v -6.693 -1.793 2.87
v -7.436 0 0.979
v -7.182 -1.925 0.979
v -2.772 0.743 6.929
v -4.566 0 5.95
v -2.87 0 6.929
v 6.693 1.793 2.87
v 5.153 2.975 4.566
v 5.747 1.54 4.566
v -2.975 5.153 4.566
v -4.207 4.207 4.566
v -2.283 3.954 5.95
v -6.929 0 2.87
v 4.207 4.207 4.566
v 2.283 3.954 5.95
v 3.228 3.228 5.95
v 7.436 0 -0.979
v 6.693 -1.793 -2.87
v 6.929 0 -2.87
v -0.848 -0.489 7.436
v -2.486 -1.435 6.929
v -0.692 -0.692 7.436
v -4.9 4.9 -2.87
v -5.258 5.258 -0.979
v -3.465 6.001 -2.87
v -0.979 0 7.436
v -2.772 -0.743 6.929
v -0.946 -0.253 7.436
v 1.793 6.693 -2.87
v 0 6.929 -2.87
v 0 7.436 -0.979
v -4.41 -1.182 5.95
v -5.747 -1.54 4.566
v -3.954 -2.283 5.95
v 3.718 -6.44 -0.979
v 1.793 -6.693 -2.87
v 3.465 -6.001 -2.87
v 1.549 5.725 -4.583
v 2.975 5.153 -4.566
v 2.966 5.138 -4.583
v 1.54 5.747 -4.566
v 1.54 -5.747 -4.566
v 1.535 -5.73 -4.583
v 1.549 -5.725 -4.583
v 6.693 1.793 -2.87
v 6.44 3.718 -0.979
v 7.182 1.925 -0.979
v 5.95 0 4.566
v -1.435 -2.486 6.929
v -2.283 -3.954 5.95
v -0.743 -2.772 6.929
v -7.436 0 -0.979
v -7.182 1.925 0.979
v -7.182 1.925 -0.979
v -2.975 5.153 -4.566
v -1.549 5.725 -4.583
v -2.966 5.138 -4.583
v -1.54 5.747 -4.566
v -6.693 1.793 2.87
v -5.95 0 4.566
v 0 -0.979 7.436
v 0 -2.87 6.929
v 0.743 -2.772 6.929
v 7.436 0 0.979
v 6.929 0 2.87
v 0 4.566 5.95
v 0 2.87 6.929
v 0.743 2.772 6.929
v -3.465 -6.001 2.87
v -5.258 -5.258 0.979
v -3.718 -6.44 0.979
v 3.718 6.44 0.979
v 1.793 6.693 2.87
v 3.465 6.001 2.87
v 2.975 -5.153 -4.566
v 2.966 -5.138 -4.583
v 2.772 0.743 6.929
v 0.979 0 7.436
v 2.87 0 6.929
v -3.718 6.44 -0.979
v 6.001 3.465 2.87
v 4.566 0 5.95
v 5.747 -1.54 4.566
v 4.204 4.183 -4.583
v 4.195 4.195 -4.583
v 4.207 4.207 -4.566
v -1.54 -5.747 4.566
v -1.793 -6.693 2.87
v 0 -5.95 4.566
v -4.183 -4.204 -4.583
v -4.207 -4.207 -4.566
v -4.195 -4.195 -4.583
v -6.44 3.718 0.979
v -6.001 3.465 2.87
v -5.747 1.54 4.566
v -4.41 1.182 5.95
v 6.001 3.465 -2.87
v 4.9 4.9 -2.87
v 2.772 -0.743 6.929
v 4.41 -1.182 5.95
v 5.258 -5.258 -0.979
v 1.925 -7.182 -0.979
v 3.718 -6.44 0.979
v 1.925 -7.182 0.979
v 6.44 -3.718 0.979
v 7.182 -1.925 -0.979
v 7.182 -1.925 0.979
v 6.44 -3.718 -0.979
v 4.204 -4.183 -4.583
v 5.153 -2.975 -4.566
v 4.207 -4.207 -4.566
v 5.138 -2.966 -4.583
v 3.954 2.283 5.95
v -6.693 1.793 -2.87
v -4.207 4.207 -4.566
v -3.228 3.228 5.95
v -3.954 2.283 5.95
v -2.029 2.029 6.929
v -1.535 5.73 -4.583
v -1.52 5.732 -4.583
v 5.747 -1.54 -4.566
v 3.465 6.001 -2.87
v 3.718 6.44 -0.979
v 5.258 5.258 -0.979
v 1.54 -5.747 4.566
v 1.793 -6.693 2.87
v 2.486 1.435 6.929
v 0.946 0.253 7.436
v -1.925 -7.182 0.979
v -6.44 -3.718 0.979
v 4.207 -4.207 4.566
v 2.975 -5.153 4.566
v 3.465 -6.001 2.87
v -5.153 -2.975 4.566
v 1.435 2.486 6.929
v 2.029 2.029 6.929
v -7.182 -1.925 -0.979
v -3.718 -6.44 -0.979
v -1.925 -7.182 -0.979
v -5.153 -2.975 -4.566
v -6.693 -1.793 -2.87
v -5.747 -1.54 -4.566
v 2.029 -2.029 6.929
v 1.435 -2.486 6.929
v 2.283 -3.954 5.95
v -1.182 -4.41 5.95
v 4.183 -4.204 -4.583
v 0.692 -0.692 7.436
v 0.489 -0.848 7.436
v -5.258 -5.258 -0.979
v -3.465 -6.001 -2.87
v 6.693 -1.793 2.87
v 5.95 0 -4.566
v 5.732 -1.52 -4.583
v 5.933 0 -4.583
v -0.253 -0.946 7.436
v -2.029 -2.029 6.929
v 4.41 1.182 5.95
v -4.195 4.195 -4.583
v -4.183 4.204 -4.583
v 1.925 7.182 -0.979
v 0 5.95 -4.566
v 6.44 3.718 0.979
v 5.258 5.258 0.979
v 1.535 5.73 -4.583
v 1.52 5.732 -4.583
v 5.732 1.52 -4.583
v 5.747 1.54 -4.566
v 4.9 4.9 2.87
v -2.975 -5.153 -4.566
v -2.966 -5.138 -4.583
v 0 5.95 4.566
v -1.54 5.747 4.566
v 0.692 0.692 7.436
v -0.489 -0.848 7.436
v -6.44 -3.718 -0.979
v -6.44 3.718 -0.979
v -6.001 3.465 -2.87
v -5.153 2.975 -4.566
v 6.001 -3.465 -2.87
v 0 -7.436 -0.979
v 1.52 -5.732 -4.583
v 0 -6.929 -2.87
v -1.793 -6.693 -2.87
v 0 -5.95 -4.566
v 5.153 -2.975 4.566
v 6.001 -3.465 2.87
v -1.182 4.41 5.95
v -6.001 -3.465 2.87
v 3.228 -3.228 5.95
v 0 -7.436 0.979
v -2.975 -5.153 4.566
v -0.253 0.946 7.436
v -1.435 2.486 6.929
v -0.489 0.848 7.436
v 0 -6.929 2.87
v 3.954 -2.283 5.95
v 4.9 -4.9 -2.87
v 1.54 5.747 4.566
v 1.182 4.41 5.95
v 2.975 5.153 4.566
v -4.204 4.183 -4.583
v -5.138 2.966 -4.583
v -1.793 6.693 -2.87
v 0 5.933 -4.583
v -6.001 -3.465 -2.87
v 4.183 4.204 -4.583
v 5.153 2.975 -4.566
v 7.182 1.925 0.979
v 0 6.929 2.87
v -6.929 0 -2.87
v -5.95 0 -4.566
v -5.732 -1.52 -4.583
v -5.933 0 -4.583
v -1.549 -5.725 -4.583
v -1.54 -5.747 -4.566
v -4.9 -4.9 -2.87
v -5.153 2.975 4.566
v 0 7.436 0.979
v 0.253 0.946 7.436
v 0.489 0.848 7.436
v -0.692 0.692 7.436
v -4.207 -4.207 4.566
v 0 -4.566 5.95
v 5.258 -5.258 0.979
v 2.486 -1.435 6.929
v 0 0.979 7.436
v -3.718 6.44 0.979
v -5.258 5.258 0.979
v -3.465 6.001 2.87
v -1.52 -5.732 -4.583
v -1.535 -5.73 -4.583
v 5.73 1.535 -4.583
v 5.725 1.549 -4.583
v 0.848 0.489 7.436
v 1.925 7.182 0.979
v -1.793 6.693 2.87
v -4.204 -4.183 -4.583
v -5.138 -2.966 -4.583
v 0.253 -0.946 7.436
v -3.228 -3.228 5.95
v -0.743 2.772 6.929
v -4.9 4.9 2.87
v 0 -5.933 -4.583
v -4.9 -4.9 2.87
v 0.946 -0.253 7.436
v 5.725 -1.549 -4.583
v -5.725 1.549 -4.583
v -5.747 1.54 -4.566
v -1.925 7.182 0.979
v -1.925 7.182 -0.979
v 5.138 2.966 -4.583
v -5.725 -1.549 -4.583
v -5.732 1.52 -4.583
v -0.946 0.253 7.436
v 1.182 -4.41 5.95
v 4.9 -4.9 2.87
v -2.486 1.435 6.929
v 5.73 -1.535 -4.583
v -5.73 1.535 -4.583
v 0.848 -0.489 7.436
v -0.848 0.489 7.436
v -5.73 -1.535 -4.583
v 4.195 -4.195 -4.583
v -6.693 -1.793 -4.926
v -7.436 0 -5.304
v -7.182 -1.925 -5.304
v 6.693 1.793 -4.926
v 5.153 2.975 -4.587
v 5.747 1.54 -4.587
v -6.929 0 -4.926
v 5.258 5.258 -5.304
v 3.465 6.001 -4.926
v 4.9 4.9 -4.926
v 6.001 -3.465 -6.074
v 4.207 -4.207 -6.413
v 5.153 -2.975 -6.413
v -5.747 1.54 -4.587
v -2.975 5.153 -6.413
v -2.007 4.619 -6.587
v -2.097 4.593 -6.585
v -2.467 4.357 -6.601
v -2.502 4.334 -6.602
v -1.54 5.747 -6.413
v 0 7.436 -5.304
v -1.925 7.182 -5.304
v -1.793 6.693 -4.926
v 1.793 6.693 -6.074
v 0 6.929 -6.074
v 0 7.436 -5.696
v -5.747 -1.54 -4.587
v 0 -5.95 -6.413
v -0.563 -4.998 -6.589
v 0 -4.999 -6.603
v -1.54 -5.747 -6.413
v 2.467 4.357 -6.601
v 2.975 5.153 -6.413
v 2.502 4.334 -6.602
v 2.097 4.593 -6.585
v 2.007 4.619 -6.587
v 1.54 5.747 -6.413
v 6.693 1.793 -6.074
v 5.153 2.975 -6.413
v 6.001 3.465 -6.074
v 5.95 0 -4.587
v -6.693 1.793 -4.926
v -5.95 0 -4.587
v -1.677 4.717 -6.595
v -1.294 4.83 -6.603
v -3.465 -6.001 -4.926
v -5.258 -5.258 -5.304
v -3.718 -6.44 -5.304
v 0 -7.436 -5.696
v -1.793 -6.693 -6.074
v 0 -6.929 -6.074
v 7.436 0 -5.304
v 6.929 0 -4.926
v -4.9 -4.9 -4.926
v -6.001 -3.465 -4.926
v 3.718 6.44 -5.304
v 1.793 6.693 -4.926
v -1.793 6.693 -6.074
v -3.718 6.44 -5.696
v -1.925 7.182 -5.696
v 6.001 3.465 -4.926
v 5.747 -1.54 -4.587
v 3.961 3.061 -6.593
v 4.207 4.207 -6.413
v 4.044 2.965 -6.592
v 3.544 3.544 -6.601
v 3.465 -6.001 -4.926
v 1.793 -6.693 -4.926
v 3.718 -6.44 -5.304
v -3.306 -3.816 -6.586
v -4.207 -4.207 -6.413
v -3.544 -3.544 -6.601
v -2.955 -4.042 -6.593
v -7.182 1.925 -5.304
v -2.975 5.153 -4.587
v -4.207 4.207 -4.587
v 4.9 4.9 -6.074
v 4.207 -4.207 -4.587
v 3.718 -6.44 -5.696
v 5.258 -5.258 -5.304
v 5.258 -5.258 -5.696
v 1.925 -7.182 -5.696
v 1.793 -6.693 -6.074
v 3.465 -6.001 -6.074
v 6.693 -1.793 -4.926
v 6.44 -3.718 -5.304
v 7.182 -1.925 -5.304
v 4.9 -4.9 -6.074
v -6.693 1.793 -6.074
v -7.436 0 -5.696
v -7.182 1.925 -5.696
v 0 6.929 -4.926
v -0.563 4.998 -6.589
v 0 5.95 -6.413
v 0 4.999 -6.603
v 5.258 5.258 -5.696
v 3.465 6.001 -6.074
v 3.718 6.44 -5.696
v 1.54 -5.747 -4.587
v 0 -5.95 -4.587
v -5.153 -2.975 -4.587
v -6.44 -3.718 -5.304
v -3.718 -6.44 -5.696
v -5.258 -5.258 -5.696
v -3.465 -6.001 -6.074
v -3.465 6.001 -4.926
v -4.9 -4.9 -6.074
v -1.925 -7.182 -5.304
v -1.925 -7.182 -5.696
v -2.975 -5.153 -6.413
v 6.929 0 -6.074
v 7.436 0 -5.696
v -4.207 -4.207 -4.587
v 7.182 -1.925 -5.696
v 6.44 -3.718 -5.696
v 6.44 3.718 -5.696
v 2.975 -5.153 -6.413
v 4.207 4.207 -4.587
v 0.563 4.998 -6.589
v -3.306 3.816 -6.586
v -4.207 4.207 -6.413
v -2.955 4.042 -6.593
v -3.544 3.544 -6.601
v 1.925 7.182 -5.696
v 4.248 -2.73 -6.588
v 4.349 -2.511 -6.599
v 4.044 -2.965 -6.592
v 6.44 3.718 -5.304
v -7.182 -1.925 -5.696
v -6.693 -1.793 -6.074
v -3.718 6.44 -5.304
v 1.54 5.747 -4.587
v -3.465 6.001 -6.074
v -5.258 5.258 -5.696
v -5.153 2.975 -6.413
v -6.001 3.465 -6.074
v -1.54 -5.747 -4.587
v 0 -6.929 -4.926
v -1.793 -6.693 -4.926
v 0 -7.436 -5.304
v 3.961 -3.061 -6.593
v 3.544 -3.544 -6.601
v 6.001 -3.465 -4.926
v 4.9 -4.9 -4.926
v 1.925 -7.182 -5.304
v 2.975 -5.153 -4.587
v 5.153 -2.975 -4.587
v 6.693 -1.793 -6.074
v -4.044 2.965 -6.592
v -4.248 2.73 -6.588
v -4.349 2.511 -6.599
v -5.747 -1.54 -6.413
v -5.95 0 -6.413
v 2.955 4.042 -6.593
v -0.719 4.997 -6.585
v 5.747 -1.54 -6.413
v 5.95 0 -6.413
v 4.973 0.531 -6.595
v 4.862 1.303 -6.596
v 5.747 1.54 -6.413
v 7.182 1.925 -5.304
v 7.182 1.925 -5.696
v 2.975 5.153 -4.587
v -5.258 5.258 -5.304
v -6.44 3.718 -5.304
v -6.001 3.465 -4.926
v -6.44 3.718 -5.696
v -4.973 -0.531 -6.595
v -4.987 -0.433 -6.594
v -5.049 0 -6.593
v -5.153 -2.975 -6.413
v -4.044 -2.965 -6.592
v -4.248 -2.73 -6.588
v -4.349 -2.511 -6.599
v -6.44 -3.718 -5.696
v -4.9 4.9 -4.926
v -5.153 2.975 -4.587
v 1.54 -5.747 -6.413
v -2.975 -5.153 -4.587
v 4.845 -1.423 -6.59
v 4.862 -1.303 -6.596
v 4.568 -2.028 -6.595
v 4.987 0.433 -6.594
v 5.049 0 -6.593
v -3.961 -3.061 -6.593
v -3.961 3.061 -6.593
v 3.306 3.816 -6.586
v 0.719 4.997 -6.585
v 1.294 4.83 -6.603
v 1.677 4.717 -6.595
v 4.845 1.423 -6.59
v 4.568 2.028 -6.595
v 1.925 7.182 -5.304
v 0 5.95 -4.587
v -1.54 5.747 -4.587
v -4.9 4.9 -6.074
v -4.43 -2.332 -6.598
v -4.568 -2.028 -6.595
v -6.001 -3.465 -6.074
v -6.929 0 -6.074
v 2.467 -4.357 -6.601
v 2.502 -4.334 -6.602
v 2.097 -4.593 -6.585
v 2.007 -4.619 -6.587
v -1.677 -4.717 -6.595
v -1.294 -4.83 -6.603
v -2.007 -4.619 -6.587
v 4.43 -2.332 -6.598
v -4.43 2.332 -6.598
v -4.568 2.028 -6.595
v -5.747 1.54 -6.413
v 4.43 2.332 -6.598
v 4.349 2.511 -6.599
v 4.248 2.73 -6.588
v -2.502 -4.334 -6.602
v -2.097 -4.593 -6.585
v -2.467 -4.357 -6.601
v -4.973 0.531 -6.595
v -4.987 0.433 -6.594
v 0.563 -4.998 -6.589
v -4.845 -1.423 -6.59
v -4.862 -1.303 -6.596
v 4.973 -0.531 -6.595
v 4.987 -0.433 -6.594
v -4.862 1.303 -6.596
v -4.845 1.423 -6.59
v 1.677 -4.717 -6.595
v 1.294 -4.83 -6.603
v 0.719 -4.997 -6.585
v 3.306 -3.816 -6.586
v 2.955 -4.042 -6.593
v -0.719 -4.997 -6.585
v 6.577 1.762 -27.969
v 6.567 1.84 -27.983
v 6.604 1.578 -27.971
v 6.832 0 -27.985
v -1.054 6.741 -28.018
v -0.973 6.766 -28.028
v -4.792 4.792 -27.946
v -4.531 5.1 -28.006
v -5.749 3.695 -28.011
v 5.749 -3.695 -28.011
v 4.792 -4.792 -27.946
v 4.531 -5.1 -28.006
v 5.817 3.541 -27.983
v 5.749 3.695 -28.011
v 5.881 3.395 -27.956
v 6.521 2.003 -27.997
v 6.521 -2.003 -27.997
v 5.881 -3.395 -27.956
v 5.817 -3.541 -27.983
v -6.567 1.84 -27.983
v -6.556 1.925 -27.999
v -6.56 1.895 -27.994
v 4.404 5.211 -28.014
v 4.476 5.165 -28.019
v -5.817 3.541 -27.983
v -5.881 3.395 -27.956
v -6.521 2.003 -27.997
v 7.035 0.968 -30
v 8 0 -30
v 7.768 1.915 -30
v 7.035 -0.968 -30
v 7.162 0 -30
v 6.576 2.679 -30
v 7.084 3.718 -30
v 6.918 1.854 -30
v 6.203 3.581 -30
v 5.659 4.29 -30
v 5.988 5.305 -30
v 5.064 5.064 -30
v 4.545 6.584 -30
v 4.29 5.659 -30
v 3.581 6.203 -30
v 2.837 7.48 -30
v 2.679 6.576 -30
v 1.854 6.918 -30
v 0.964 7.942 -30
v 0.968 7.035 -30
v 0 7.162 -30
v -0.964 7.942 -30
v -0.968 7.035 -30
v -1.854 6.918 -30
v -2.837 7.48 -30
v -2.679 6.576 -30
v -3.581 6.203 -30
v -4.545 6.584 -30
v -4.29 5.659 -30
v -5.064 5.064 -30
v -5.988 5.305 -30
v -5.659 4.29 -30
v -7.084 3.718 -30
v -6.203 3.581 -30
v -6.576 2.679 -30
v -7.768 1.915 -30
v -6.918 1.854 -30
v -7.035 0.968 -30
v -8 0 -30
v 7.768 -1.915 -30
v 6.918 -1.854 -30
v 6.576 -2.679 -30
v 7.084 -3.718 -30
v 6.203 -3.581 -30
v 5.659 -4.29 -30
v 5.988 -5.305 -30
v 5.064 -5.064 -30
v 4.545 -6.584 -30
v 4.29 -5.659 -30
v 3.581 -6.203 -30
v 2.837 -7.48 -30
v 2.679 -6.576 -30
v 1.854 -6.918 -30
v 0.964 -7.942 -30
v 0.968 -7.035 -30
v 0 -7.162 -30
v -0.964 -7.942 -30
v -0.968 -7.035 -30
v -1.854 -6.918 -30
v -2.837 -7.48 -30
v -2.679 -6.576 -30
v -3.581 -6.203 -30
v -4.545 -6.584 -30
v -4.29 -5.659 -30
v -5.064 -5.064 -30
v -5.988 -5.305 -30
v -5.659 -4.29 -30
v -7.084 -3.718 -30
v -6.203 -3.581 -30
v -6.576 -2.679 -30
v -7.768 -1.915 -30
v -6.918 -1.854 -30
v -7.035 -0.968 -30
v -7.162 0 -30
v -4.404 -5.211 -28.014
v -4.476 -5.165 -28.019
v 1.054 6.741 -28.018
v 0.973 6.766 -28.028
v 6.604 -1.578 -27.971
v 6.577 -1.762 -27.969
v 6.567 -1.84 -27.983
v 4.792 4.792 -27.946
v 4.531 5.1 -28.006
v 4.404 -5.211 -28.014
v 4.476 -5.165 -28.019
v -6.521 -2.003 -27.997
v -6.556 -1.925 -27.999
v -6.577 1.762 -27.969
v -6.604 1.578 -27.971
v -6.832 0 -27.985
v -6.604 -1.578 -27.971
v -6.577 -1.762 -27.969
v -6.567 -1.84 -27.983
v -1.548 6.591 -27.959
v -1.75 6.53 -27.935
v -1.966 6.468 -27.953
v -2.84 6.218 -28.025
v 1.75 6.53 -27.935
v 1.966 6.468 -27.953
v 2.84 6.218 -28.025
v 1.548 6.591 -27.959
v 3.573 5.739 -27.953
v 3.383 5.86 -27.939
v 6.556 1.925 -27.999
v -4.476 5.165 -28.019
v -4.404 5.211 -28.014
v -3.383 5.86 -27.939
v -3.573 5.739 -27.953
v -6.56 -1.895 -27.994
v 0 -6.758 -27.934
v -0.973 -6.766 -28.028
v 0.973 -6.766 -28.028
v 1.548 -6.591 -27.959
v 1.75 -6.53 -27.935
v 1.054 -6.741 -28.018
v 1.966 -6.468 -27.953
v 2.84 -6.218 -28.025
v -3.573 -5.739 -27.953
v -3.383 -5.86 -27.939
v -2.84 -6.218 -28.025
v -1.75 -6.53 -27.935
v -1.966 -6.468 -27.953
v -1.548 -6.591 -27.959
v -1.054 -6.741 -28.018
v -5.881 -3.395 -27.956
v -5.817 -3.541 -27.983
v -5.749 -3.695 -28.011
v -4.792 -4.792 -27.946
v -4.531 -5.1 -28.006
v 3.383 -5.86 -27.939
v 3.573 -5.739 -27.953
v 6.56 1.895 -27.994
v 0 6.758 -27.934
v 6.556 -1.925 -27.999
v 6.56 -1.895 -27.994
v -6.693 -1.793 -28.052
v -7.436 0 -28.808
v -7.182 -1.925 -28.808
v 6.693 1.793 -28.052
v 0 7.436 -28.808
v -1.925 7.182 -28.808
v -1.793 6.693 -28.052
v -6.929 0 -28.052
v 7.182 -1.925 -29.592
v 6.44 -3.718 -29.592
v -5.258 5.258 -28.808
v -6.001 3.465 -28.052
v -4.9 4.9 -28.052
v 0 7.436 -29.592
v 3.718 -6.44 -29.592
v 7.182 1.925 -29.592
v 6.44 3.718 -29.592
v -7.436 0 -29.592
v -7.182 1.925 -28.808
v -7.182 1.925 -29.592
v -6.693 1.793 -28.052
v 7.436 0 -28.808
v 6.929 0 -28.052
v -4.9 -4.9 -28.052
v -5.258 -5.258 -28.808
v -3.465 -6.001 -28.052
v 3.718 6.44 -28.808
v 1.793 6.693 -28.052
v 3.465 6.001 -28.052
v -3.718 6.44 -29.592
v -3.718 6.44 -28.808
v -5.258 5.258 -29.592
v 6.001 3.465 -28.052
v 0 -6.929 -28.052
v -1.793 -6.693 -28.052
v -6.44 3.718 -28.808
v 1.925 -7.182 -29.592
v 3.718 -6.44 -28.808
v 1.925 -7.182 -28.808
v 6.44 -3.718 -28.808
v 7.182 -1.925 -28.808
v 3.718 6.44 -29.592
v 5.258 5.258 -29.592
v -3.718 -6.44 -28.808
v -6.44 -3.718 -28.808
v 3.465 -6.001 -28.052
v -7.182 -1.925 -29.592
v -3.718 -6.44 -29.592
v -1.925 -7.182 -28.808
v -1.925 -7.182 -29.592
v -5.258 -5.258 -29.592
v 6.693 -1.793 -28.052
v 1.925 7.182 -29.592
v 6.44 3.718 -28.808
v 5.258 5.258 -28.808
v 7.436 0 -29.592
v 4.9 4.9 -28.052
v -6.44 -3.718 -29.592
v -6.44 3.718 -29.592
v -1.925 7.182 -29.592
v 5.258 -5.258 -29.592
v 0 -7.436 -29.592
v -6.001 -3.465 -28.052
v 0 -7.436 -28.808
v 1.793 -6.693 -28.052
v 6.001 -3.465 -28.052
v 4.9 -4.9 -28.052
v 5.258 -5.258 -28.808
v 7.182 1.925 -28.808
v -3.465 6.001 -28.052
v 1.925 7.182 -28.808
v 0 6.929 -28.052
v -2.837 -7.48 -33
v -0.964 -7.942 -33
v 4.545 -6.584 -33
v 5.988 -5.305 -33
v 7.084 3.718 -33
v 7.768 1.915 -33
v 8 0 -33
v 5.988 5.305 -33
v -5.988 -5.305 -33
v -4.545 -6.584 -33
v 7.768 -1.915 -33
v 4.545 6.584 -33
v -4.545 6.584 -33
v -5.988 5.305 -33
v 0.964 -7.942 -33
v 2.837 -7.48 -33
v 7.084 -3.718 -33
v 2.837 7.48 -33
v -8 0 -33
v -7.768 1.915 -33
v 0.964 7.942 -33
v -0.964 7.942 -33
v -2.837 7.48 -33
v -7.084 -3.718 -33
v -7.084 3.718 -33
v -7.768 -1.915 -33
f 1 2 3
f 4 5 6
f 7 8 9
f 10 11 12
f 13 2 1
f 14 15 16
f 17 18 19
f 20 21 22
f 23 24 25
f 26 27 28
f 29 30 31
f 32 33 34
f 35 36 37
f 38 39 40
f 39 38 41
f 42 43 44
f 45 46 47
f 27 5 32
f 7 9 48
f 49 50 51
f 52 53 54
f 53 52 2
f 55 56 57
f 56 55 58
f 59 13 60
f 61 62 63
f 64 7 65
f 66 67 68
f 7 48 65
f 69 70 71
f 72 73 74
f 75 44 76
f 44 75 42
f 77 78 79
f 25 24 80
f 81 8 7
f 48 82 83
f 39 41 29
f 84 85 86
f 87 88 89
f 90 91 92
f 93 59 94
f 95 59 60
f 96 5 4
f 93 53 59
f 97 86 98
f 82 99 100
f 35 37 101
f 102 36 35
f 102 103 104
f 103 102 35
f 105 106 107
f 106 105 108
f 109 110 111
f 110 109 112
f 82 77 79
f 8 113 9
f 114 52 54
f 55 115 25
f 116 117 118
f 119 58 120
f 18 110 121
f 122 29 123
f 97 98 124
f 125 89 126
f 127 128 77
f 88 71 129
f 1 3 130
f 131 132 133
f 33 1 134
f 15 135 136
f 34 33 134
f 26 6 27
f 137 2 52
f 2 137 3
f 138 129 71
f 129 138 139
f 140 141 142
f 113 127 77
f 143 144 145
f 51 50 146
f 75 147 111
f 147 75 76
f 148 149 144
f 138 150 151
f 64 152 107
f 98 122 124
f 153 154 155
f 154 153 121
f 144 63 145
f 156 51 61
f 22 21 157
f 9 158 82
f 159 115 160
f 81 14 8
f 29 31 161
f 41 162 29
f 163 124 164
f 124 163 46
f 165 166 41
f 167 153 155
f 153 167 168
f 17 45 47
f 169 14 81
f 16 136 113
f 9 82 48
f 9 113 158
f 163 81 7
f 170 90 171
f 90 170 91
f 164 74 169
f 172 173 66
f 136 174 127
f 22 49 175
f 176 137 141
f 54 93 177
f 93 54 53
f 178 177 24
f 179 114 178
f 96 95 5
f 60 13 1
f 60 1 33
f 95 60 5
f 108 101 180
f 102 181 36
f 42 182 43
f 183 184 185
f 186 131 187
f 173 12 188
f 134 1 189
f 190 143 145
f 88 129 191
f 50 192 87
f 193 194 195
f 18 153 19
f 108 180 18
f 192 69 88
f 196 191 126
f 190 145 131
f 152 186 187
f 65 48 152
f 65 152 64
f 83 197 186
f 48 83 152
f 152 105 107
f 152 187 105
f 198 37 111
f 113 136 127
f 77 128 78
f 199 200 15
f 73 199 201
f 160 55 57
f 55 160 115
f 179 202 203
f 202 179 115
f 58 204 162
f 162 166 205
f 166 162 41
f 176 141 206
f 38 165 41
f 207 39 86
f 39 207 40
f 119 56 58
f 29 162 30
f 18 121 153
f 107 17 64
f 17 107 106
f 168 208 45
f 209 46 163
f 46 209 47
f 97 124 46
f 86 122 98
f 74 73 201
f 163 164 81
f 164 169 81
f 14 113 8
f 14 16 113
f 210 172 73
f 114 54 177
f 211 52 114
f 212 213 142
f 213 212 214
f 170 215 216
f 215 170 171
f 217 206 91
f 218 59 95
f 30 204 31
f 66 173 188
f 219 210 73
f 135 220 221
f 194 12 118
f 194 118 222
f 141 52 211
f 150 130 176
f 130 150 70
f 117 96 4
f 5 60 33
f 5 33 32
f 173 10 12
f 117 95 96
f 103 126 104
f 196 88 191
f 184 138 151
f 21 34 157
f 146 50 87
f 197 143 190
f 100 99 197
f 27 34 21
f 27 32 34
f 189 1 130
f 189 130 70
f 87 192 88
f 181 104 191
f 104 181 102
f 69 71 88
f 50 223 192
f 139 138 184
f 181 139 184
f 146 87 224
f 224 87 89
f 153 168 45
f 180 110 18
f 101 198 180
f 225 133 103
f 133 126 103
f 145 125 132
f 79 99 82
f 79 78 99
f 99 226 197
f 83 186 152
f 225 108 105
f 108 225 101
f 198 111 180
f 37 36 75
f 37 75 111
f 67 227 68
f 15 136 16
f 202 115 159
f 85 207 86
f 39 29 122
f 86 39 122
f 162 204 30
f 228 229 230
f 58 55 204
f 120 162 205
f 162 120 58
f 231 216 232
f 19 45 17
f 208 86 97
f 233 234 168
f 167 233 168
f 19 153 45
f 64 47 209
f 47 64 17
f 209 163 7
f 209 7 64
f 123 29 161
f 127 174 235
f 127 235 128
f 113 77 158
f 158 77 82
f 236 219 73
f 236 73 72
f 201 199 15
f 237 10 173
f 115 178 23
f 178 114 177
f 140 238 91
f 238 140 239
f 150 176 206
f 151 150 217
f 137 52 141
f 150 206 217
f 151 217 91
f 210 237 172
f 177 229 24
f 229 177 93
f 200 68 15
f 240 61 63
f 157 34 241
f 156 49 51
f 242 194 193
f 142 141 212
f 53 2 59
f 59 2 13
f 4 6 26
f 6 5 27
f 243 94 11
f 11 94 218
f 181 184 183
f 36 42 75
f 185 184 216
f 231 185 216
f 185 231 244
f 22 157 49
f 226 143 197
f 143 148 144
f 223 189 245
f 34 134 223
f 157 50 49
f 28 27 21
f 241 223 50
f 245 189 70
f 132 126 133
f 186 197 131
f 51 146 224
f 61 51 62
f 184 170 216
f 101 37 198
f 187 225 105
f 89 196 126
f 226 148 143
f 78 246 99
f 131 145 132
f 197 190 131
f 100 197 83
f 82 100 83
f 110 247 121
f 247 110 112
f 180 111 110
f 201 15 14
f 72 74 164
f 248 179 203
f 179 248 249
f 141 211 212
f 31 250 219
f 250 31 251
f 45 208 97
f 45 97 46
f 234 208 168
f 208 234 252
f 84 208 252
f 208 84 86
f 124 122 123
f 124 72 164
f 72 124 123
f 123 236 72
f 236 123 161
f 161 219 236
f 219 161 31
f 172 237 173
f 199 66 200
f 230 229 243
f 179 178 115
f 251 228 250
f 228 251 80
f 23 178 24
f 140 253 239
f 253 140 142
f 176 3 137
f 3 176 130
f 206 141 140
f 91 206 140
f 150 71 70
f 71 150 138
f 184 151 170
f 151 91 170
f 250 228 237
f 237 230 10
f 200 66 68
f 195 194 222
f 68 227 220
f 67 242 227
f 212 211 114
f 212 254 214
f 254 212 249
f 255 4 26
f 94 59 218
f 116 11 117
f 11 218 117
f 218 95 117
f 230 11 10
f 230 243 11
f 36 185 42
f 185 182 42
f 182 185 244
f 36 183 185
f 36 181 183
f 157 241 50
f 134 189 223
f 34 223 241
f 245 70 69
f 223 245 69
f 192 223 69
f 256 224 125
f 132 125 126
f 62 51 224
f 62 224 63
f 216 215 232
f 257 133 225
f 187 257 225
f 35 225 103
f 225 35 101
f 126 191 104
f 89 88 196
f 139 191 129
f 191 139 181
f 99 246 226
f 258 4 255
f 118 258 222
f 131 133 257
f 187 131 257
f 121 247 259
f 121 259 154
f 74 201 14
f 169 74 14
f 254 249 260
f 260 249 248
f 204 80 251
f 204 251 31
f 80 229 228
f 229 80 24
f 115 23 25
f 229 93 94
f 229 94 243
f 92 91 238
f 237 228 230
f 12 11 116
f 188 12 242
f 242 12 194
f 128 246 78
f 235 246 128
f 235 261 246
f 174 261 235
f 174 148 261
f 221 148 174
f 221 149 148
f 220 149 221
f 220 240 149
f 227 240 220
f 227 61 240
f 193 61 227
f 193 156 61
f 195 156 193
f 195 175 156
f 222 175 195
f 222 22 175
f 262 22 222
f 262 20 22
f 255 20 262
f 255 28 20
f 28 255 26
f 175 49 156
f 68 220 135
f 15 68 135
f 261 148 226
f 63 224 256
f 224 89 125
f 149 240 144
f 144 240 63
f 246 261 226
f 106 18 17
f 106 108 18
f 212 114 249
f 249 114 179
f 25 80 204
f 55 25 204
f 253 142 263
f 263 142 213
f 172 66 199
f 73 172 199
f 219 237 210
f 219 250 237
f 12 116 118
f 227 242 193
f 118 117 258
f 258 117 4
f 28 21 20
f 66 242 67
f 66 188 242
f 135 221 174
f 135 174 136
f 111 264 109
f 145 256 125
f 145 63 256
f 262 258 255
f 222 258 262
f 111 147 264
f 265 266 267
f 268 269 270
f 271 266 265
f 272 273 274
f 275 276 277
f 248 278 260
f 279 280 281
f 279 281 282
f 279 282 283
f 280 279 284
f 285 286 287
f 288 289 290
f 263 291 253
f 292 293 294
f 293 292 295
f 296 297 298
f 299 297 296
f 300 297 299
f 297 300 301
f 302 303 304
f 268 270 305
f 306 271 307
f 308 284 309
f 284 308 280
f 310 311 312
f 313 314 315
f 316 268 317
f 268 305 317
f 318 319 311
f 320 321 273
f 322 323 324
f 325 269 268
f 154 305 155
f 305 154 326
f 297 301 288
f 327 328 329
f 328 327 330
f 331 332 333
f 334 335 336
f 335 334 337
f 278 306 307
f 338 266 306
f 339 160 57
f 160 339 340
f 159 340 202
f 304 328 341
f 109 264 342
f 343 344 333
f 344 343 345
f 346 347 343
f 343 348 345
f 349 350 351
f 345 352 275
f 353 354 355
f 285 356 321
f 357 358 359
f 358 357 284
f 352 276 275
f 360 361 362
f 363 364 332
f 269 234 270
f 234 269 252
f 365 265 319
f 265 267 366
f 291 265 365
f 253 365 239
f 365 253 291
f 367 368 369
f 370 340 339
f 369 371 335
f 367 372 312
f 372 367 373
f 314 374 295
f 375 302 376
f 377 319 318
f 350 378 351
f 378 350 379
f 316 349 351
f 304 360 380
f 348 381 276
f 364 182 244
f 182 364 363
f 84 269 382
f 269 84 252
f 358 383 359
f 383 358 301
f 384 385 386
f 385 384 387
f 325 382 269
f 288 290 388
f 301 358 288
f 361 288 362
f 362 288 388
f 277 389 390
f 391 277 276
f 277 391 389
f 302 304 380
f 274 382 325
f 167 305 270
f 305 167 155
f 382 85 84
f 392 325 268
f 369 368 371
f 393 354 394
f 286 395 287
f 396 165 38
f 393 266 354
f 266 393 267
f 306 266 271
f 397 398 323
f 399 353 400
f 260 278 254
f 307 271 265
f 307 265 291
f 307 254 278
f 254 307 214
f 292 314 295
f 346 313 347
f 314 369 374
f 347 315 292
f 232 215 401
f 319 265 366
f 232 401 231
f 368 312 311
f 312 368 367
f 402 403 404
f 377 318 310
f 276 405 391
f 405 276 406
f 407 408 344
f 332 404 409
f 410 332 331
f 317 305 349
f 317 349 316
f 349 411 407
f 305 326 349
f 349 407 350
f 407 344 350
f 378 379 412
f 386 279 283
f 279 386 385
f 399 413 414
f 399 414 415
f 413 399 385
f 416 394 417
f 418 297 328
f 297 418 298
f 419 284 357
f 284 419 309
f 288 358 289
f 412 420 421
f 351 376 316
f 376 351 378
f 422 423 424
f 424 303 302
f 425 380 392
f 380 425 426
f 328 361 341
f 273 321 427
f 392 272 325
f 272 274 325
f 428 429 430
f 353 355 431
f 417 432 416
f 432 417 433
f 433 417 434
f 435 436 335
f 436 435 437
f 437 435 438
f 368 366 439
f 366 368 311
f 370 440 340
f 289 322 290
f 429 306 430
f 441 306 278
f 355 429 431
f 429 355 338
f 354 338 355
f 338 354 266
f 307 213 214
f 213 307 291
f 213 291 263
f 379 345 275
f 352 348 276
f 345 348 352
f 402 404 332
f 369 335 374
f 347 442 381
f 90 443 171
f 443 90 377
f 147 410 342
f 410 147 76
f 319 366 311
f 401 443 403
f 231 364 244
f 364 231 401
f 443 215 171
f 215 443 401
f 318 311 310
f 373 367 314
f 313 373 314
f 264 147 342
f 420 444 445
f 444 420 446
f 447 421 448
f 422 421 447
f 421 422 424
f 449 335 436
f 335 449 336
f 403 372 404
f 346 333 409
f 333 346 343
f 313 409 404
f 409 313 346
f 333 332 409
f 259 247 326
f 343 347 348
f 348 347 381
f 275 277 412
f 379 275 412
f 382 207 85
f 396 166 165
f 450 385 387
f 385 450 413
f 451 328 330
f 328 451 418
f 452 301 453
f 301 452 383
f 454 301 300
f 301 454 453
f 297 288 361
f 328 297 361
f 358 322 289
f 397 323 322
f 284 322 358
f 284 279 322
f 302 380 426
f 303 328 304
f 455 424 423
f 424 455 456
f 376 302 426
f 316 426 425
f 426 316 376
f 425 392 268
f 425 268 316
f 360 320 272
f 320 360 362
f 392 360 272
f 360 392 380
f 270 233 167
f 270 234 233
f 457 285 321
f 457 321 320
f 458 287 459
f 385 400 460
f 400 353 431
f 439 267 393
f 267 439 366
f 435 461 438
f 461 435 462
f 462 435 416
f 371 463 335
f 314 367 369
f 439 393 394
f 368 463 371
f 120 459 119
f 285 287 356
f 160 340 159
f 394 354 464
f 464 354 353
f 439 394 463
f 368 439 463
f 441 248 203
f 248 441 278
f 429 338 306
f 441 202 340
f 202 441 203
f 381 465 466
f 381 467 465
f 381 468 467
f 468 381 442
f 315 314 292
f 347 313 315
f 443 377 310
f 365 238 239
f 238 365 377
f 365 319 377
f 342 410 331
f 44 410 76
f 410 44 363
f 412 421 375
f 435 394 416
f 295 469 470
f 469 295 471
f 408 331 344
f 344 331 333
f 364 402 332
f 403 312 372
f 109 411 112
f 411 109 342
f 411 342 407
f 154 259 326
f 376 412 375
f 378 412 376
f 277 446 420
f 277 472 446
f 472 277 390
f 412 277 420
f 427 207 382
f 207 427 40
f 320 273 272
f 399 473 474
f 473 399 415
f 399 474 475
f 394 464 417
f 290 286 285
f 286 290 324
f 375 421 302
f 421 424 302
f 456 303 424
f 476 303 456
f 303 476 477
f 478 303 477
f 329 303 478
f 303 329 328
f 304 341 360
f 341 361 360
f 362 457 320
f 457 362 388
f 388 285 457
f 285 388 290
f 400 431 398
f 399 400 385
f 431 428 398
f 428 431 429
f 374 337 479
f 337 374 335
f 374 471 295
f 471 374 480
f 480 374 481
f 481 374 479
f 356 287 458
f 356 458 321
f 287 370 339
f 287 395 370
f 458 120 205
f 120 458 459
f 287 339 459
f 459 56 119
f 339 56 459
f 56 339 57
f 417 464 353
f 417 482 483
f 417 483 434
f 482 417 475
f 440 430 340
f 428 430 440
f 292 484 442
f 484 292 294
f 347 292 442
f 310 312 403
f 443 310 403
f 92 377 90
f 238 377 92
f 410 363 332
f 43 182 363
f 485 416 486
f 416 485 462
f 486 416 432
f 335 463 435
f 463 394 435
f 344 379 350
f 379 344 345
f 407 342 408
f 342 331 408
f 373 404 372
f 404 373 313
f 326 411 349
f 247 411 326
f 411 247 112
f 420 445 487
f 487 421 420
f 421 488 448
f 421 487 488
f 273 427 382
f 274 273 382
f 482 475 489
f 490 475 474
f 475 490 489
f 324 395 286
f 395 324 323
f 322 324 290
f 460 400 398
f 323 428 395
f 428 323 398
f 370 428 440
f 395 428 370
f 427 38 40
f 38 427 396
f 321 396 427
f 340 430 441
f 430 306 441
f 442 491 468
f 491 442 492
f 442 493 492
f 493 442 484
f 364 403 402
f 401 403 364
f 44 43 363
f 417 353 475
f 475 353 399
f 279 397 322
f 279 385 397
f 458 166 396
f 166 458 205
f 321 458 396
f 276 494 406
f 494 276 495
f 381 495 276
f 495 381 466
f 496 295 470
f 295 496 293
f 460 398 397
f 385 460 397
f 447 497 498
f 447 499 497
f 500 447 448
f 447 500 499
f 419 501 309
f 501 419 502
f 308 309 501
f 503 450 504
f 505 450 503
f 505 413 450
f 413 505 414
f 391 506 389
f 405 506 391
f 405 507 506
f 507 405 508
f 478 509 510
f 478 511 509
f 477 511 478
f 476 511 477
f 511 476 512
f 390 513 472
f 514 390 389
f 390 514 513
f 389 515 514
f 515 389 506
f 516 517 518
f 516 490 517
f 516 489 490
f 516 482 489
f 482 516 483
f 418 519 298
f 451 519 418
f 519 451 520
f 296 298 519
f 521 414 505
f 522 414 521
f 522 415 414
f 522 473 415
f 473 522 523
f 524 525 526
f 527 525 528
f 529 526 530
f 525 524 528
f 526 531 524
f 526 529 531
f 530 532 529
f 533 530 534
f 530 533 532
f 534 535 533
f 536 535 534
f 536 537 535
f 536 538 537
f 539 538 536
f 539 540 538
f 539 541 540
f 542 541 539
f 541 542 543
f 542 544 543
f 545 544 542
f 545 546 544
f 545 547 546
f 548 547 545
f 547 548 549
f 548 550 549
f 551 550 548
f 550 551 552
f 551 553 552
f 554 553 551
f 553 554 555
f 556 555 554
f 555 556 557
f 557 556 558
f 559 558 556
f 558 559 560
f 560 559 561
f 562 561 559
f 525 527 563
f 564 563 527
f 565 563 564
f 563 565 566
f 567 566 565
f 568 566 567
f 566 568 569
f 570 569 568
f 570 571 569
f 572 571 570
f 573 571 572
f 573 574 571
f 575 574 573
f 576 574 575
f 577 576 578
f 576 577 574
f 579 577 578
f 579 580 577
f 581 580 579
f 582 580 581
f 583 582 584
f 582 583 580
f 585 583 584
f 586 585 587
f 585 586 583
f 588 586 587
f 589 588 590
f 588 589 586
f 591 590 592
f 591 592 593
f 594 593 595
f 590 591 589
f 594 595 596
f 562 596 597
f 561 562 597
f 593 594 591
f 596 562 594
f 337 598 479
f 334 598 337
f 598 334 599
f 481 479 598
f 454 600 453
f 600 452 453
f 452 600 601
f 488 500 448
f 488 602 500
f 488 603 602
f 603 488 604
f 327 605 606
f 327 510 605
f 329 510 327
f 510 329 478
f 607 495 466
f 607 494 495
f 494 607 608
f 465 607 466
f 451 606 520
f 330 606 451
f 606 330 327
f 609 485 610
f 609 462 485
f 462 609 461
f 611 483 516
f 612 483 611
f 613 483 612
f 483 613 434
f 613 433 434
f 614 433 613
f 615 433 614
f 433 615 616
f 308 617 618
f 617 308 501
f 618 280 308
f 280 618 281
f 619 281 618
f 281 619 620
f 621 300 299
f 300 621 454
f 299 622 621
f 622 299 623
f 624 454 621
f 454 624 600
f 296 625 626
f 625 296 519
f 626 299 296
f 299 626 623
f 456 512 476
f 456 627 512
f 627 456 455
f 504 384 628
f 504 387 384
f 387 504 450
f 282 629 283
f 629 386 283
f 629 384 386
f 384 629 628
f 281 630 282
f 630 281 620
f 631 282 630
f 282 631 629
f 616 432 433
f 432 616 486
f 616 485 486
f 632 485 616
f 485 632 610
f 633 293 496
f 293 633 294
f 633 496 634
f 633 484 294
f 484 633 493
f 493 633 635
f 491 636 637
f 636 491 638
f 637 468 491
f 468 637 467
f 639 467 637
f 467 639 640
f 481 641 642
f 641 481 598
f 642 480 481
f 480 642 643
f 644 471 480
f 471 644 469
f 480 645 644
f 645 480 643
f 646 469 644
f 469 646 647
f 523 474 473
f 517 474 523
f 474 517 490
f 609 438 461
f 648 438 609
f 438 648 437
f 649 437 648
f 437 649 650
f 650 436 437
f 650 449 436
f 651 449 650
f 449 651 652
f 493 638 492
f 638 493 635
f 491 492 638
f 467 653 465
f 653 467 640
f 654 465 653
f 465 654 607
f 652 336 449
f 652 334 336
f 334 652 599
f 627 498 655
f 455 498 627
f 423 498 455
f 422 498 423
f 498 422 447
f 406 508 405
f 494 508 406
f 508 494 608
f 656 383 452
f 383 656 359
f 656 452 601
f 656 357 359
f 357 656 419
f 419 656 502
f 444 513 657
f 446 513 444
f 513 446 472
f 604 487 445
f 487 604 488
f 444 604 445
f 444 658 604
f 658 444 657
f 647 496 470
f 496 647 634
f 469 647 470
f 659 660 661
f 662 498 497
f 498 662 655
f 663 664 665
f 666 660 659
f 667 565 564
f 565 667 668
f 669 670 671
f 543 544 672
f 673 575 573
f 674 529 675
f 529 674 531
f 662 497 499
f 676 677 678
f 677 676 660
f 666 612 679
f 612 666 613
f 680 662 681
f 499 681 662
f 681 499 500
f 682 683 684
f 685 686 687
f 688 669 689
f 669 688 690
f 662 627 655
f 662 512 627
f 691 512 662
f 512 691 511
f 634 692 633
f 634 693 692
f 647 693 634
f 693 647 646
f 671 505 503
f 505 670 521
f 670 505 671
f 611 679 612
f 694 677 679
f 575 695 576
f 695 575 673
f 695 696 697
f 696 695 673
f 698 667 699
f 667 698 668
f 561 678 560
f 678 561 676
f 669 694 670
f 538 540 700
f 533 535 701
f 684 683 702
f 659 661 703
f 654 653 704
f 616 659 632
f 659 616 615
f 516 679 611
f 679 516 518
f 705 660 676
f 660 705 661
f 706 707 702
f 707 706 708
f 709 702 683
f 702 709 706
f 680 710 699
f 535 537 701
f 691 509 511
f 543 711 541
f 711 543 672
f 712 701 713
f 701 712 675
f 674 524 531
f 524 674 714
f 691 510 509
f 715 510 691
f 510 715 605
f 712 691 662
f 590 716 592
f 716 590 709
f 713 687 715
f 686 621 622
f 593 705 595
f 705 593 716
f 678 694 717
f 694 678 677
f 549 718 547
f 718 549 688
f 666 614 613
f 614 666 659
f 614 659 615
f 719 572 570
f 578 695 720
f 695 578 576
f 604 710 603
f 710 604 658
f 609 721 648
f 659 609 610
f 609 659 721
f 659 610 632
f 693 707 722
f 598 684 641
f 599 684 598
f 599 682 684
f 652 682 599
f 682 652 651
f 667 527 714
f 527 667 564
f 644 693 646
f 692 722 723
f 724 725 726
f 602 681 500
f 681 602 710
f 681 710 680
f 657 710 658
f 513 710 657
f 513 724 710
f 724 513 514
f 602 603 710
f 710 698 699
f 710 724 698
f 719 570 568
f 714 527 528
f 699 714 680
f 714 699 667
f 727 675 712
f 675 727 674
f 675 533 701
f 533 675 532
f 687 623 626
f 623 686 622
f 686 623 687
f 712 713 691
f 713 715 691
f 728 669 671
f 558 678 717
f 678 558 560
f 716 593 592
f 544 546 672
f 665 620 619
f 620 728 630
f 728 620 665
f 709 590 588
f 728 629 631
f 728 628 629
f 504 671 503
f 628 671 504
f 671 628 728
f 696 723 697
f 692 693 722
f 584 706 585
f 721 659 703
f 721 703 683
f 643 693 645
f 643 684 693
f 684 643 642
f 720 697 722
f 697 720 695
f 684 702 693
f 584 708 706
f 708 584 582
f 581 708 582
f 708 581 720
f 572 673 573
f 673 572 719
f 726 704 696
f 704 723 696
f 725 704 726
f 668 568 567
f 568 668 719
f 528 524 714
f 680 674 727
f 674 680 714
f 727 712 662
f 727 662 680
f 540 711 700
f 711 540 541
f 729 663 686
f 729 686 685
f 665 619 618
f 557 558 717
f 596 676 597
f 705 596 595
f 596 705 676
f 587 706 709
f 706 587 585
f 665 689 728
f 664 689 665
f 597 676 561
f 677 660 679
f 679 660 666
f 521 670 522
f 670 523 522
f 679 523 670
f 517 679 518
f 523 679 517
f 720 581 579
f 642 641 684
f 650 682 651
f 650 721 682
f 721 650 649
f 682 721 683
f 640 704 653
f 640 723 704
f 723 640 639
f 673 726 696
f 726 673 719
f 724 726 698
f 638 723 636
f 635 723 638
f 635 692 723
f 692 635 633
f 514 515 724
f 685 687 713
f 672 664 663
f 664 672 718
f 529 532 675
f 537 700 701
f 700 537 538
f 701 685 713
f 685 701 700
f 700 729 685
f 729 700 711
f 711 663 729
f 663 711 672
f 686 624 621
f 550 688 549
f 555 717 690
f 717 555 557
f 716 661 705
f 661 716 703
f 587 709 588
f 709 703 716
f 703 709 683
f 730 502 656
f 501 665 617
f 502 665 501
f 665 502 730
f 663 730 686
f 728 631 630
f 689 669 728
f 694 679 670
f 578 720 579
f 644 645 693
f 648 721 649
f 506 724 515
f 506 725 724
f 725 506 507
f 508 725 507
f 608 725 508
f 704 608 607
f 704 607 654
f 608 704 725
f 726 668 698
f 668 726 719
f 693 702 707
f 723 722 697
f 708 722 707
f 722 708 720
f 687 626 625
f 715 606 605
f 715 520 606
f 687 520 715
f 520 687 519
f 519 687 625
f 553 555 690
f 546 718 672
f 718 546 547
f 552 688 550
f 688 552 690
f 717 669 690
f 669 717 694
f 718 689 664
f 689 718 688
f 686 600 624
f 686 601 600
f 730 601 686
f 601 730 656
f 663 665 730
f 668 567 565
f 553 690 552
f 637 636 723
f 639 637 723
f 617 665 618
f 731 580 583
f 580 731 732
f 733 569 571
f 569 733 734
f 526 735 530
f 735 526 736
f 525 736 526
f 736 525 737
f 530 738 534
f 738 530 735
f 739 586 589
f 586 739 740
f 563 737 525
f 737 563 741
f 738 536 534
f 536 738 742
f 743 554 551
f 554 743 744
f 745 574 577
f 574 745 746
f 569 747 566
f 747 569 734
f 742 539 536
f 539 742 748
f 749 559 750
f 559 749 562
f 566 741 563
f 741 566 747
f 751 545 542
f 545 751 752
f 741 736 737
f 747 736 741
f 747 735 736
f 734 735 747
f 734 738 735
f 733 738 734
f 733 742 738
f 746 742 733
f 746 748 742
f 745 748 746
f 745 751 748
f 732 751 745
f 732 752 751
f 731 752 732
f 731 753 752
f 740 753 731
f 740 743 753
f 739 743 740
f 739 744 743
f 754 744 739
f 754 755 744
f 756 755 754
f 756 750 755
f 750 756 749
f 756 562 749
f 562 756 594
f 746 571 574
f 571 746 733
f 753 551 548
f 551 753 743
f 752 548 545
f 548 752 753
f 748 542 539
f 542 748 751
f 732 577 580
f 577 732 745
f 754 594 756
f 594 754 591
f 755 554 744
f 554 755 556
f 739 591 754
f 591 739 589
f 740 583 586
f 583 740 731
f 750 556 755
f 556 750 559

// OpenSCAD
union(){
    //head
    sphere(7.5);
    //ring
    scale([1,1,0.2])
    translate([0,0,-27.5])
    sphere(7.5);
    //neck
    translate([0,0,-30])
    cylinder(30,7,4.5);
    scale([1,1,0.4])
    translate([0,0,-73])
    sphere(7.5);
    translate([0,0,-33])
    cylinder(3,8,8);
    }
